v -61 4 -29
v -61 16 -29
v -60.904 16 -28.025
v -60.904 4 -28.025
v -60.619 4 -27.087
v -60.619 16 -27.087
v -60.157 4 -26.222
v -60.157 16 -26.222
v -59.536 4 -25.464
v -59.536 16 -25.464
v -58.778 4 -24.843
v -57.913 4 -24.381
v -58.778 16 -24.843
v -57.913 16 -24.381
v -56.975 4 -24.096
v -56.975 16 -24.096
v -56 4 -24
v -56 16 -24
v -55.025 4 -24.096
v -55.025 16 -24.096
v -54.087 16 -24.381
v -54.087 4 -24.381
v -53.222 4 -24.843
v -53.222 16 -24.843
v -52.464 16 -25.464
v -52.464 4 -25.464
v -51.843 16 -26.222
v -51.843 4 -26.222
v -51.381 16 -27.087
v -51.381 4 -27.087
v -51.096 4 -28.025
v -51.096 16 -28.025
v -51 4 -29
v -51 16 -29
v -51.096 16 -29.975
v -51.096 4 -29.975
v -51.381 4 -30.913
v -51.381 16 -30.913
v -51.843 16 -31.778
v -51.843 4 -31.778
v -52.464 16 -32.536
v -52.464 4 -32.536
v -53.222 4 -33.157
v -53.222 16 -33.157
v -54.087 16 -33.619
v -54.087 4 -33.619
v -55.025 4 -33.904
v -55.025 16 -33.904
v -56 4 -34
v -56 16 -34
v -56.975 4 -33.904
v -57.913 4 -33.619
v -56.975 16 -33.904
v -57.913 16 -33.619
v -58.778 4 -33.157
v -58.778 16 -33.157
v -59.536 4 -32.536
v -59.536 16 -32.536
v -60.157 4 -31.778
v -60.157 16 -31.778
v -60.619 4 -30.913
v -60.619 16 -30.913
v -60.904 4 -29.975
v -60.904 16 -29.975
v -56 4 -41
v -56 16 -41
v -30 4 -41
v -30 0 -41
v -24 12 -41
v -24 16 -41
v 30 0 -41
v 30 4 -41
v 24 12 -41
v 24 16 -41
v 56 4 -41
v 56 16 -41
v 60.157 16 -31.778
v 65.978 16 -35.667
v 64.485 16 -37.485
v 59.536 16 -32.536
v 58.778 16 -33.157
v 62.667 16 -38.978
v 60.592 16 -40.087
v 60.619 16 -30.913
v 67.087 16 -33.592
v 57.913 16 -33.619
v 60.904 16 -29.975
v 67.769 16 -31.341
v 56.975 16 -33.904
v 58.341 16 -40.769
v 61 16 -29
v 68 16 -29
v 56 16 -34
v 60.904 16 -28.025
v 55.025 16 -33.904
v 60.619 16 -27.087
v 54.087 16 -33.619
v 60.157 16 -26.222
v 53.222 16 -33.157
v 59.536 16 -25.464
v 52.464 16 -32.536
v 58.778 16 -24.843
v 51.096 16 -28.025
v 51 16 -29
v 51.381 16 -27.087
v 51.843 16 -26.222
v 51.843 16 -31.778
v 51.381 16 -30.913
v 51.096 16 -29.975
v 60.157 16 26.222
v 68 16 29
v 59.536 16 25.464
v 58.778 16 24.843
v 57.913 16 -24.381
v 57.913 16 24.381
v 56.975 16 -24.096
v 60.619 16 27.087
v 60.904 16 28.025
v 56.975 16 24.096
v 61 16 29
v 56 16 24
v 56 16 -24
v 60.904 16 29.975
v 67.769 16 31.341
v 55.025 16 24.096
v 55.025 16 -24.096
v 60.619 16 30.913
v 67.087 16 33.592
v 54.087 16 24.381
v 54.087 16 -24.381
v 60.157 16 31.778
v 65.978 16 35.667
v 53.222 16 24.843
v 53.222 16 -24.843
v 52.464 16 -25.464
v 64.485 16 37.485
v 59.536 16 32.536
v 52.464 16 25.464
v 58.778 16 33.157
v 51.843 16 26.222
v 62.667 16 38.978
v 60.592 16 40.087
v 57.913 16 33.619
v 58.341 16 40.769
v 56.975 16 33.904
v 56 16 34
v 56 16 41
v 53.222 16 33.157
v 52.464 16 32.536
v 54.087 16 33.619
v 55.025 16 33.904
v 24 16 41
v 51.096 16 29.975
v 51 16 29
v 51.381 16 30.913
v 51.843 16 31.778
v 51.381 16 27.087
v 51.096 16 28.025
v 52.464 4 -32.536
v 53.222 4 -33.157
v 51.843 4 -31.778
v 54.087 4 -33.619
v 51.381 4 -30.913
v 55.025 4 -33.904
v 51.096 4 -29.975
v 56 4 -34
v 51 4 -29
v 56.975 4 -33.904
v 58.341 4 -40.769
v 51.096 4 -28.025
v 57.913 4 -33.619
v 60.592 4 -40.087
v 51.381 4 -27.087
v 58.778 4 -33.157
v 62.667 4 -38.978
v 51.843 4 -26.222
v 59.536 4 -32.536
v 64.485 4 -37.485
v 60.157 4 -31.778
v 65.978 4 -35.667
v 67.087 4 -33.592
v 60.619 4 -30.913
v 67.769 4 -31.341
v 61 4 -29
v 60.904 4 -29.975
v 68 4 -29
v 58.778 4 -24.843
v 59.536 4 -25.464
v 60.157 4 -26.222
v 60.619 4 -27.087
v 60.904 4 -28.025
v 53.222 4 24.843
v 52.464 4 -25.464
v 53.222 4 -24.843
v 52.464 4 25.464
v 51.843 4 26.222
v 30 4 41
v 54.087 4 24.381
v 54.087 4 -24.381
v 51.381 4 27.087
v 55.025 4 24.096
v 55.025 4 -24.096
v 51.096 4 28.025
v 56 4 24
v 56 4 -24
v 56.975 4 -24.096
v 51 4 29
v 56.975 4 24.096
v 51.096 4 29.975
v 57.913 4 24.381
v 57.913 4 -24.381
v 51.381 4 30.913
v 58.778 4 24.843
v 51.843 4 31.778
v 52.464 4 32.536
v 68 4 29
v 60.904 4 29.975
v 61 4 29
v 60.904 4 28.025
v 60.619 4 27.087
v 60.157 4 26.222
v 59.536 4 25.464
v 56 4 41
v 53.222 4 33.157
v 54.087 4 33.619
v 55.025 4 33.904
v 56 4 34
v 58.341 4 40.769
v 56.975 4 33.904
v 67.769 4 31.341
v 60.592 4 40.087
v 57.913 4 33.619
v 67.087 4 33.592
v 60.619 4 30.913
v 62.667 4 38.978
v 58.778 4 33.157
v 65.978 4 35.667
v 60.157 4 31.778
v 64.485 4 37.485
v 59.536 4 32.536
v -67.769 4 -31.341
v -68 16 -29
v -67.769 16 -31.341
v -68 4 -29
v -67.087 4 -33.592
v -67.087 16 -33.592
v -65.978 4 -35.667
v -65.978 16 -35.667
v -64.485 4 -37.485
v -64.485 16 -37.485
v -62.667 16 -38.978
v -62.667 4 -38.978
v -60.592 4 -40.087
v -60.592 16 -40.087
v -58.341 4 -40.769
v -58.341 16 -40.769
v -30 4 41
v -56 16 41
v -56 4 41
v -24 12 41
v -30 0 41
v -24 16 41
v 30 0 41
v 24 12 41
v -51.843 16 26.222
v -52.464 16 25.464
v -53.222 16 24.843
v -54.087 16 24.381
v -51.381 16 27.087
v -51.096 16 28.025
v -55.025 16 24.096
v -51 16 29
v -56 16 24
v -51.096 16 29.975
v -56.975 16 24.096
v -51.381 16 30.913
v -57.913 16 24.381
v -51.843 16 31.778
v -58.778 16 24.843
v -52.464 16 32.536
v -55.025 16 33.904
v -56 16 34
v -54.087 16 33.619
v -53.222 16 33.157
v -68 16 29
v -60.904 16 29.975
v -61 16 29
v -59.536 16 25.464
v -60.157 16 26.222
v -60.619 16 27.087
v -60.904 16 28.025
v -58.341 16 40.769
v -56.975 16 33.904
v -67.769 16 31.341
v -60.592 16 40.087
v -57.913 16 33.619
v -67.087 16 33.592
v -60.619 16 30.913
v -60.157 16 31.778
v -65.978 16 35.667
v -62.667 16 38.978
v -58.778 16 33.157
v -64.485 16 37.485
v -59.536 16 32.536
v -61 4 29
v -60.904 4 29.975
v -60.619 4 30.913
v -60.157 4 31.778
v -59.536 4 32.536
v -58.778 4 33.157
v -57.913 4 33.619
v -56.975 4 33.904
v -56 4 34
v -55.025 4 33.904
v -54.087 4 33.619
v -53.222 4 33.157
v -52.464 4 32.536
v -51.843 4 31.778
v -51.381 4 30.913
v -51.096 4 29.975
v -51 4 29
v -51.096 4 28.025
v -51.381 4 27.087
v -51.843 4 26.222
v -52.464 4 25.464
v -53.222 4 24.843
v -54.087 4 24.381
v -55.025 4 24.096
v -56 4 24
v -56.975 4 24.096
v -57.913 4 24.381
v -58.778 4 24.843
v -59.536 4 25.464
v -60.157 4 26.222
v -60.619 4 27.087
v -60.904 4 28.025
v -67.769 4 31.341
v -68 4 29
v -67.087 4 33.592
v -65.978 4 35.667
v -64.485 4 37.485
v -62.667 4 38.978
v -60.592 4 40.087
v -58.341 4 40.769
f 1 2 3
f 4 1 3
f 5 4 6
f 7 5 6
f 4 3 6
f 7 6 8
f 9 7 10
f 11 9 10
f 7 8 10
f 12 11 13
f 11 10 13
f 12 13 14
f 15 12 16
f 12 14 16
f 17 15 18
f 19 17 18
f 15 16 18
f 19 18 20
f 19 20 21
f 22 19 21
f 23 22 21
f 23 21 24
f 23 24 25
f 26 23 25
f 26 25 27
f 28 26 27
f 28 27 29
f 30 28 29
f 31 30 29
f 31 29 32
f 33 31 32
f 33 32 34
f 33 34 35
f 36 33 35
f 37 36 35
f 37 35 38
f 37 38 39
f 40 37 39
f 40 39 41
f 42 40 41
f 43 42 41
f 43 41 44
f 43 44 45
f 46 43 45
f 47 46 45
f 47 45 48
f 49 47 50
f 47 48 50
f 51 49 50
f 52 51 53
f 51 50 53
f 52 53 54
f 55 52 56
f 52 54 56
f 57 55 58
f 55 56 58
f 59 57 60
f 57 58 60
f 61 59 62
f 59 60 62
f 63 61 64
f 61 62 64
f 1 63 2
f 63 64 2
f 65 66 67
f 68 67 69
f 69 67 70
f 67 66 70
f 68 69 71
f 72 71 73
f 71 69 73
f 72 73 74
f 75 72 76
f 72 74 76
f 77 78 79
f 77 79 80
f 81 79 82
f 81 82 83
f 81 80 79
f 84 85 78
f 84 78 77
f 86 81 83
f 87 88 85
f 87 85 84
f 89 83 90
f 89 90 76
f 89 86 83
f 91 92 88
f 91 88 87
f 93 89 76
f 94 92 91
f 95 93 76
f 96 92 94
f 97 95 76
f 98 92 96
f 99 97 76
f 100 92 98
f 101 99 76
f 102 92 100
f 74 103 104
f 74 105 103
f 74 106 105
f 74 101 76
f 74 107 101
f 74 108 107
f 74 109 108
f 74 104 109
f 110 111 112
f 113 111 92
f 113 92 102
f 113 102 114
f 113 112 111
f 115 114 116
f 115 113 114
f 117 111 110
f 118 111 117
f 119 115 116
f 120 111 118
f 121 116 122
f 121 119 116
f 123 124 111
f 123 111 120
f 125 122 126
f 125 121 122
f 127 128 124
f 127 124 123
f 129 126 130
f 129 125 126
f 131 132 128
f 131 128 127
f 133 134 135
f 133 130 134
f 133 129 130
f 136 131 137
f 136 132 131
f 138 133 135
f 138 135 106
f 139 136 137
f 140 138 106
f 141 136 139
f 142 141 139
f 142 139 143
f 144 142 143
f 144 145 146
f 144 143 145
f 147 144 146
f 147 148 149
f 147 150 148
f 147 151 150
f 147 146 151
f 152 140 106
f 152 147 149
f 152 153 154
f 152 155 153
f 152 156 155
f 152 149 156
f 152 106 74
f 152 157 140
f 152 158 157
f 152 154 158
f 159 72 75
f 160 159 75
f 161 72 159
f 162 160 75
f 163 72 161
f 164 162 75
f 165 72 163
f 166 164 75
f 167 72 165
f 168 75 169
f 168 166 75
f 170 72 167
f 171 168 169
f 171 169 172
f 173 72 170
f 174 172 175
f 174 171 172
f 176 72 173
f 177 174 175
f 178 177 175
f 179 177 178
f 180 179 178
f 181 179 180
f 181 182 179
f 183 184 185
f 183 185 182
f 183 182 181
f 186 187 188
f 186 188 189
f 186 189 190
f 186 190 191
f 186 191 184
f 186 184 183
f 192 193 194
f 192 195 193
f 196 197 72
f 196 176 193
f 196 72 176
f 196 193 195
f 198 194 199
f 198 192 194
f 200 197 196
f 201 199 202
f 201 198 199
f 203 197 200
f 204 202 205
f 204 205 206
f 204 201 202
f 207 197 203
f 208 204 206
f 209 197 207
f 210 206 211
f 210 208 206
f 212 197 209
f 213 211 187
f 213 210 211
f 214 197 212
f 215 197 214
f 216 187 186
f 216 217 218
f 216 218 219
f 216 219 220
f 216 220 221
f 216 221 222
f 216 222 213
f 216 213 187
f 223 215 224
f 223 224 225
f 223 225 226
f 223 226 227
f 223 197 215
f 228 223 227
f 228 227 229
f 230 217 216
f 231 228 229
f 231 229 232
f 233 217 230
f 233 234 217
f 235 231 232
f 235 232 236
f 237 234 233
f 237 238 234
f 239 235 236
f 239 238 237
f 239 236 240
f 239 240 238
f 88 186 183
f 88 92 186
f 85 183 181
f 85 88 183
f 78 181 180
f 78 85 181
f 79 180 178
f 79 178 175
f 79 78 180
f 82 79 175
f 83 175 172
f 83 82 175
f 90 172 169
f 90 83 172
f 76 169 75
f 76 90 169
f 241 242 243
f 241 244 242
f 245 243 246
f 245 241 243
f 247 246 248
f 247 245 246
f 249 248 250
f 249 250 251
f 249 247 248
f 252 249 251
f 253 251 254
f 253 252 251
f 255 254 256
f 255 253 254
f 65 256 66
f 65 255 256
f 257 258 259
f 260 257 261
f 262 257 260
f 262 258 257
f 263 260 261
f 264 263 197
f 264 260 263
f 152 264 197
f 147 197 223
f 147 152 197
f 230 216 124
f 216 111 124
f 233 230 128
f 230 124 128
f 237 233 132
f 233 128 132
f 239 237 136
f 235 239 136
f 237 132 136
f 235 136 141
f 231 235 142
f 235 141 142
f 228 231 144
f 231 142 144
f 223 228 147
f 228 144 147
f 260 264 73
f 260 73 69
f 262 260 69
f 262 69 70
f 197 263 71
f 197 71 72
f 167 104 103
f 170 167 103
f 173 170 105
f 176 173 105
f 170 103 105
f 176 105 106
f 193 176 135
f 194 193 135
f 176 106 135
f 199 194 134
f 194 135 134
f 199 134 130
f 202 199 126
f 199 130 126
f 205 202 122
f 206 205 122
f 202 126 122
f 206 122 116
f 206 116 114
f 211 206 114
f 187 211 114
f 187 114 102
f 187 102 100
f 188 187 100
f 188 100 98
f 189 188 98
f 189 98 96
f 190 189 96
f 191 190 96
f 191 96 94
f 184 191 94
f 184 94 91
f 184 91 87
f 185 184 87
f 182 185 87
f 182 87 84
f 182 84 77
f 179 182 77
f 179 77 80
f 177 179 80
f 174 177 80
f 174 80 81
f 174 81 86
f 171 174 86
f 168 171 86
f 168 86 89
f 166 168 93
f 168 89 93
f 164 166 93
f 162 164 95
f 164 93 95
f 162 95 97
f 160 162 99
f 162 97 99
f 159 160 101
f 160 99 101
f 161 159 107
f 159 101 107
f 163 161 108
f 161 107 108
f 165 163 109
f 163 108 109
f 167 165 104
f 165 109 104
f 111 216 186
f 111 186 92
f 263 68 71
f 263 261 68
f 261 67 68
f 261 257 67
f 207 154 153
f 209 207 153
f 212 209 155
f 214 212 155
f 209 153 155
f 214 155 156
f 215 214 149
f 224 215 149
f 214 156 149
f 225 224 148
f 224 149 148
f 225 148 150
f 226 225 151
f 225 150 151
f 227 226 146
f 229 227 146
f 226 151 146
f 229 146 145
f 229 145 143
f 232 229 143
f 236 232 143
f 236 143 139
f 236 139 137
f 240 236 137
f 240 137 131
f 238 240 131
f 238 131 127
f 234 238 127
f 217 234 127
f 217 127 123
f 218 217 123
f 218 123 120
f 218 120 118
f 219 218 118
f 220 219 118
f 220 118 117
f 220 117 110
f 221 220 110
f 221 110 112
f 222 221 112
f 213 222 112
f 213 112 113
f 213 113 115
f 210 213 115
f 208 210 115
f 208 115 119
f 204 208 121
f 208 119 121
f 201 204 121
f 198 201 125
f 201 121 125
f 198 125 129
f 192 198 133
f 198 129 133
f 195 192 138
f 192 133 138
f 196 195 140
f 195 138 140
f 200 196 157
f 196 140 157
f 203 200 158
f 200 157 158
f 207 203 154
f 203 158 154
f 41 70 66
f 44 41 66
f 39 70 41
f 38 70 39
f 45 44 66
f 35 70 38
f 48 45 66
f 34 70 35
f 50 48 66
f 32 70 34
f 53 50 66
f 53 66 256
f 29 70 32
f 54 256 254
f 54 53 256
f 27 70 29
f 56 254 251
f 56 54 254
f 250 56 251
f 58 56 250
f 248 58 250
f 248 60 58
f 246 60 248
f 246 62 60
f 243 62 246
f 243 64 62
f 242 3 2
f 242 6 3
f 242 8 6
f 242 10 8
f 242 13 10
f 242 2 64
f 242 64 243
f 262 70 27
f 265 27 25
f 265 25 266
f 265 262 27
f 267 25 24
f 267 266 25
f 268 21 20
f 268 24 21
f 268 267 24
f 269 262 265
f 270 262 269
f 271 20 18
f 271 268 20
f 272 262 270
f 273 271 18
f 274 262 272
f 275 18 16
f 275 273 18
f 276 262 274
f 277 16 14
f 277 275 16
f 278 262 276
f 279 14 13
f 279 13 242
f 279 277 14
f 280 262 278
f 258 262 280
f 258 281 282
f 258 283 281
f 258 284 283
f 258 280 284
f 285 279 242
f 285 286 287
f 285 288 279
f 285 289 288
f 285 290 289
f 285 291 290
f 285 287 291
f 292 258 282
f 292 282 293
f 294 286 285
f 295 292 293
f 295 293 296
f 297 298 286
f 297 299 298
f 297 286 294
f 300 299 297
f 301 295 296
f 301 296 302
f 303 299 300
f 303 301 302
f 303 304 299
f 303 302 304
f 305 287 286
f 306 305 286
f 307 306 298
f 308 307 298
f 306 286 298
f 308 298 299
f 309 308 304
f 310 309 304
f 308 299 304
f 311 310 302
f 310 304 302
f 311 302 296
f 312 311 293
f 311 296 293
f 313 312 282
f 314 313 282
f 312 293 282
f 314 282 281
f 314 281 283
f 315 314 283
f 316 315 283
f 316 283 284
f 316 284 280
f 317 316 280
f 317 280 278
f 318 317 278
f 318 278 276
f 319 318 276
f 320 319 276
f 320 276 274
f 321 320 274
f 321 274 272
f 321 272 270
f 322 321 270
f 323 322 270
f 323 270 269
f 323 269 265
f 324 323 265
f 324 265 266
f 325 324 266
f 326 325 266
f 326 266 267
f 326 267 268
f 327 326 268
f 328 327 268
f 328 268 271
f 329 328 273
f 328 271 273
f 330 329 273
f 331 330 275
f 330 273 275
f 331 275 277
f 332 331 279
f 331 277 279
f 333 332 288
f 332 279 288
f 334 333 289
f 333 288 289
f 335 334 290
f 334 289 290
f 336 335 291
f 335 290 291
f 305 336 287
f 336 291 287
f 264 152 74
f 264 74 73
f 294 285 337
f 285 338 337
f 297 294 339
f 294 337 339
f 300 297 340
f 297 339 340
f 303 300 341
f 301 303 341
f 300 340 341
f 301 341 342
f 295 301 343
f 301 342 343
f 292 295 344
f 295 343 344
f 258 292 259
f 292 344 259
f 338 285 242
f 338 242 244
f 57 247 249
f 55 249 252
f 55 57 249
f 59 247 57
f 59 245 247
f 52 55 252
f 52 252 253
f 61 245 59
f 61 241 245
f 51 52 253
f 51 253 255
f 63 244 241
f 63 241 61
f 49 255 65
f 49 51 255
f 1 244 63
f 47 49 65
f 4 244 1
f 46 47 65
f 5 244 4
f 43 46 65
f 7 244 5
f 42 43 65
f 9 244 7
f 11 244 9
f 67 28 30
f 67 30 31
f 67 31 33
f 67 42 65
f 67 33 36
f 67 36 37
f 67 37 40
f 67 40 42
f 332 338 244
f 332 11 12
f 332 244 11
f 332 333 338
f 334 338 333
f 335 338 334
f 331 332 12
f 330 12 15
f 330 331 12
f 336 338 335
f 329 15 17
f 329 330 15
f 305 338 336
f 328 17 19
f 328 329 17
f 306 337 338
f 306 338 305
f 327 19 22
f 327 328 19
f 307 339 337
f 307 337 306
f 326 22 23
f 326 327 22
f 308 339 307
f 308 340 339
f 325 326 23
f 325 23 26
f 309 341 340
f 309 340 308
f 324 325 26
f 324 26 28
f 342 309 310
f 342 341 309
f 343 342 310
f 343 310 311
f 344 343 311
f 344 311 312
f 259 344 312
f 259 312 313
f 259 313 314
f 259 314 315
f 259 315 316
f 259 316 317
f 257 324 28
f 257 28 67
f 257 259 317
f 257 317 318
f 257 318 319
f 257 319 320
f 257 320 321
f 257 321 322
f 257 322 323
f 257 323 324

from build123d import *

# Parameters (mm, degrees)
EXTRUDE_1_DEPTH     = 41
FILLET_1_R          = 12
SKETCH_2_R          = 5
CUT_EXTRUDE_1_DEPTH = 82


with BuildPart() as part:
    # 草圖1 → 伸長1 (new, symmetric)
    with BuildSketch(Plane.XY):
        Polygon((-30, 0), (30, 0), (30, 4), (68, 4), (68, 16), (24, 16), (24, 12), (-24, 12), (-24, 16), (-68, 16), (-68, 4), (-30, 4), align=None)
    extrude(amount=EXTRUDE_1_DEPTH, both=True)

    # 圓角1
    fillet_1_edges = [part.edges().sort_by_distance(p)[0] for p in [
        (68, 10, 41),
        (-68, 10, -41),
        (68, 10, -41),
        (-68, 10, 41),
    ]]
    fillet(fillet_1_edges, radius=FILLET_1_R)

    # 草圖2 → 除料-伸長1 (cut, through all)
    with BuildSketch(Plane(origin=(0, 16, 0), x_dir=(-1, 0, 0), z_dir=(0, 1, 0))):
        with Locations((-56, -29)):
            Circle(SKETCH_2_R)
        with Locations((-56, 29)):
            Circle(SKETCH_2_R)
        with Locations((56, -29)):
            Circle(SKETCH_2_R)
        with Locations((56, 29)):
            Circle(SKETCH_2_R)
    extrude(amount=-CUT_EXTRUDE_1_DEPTH, mode=Mode.SUBTRACT)


solid = part.part
